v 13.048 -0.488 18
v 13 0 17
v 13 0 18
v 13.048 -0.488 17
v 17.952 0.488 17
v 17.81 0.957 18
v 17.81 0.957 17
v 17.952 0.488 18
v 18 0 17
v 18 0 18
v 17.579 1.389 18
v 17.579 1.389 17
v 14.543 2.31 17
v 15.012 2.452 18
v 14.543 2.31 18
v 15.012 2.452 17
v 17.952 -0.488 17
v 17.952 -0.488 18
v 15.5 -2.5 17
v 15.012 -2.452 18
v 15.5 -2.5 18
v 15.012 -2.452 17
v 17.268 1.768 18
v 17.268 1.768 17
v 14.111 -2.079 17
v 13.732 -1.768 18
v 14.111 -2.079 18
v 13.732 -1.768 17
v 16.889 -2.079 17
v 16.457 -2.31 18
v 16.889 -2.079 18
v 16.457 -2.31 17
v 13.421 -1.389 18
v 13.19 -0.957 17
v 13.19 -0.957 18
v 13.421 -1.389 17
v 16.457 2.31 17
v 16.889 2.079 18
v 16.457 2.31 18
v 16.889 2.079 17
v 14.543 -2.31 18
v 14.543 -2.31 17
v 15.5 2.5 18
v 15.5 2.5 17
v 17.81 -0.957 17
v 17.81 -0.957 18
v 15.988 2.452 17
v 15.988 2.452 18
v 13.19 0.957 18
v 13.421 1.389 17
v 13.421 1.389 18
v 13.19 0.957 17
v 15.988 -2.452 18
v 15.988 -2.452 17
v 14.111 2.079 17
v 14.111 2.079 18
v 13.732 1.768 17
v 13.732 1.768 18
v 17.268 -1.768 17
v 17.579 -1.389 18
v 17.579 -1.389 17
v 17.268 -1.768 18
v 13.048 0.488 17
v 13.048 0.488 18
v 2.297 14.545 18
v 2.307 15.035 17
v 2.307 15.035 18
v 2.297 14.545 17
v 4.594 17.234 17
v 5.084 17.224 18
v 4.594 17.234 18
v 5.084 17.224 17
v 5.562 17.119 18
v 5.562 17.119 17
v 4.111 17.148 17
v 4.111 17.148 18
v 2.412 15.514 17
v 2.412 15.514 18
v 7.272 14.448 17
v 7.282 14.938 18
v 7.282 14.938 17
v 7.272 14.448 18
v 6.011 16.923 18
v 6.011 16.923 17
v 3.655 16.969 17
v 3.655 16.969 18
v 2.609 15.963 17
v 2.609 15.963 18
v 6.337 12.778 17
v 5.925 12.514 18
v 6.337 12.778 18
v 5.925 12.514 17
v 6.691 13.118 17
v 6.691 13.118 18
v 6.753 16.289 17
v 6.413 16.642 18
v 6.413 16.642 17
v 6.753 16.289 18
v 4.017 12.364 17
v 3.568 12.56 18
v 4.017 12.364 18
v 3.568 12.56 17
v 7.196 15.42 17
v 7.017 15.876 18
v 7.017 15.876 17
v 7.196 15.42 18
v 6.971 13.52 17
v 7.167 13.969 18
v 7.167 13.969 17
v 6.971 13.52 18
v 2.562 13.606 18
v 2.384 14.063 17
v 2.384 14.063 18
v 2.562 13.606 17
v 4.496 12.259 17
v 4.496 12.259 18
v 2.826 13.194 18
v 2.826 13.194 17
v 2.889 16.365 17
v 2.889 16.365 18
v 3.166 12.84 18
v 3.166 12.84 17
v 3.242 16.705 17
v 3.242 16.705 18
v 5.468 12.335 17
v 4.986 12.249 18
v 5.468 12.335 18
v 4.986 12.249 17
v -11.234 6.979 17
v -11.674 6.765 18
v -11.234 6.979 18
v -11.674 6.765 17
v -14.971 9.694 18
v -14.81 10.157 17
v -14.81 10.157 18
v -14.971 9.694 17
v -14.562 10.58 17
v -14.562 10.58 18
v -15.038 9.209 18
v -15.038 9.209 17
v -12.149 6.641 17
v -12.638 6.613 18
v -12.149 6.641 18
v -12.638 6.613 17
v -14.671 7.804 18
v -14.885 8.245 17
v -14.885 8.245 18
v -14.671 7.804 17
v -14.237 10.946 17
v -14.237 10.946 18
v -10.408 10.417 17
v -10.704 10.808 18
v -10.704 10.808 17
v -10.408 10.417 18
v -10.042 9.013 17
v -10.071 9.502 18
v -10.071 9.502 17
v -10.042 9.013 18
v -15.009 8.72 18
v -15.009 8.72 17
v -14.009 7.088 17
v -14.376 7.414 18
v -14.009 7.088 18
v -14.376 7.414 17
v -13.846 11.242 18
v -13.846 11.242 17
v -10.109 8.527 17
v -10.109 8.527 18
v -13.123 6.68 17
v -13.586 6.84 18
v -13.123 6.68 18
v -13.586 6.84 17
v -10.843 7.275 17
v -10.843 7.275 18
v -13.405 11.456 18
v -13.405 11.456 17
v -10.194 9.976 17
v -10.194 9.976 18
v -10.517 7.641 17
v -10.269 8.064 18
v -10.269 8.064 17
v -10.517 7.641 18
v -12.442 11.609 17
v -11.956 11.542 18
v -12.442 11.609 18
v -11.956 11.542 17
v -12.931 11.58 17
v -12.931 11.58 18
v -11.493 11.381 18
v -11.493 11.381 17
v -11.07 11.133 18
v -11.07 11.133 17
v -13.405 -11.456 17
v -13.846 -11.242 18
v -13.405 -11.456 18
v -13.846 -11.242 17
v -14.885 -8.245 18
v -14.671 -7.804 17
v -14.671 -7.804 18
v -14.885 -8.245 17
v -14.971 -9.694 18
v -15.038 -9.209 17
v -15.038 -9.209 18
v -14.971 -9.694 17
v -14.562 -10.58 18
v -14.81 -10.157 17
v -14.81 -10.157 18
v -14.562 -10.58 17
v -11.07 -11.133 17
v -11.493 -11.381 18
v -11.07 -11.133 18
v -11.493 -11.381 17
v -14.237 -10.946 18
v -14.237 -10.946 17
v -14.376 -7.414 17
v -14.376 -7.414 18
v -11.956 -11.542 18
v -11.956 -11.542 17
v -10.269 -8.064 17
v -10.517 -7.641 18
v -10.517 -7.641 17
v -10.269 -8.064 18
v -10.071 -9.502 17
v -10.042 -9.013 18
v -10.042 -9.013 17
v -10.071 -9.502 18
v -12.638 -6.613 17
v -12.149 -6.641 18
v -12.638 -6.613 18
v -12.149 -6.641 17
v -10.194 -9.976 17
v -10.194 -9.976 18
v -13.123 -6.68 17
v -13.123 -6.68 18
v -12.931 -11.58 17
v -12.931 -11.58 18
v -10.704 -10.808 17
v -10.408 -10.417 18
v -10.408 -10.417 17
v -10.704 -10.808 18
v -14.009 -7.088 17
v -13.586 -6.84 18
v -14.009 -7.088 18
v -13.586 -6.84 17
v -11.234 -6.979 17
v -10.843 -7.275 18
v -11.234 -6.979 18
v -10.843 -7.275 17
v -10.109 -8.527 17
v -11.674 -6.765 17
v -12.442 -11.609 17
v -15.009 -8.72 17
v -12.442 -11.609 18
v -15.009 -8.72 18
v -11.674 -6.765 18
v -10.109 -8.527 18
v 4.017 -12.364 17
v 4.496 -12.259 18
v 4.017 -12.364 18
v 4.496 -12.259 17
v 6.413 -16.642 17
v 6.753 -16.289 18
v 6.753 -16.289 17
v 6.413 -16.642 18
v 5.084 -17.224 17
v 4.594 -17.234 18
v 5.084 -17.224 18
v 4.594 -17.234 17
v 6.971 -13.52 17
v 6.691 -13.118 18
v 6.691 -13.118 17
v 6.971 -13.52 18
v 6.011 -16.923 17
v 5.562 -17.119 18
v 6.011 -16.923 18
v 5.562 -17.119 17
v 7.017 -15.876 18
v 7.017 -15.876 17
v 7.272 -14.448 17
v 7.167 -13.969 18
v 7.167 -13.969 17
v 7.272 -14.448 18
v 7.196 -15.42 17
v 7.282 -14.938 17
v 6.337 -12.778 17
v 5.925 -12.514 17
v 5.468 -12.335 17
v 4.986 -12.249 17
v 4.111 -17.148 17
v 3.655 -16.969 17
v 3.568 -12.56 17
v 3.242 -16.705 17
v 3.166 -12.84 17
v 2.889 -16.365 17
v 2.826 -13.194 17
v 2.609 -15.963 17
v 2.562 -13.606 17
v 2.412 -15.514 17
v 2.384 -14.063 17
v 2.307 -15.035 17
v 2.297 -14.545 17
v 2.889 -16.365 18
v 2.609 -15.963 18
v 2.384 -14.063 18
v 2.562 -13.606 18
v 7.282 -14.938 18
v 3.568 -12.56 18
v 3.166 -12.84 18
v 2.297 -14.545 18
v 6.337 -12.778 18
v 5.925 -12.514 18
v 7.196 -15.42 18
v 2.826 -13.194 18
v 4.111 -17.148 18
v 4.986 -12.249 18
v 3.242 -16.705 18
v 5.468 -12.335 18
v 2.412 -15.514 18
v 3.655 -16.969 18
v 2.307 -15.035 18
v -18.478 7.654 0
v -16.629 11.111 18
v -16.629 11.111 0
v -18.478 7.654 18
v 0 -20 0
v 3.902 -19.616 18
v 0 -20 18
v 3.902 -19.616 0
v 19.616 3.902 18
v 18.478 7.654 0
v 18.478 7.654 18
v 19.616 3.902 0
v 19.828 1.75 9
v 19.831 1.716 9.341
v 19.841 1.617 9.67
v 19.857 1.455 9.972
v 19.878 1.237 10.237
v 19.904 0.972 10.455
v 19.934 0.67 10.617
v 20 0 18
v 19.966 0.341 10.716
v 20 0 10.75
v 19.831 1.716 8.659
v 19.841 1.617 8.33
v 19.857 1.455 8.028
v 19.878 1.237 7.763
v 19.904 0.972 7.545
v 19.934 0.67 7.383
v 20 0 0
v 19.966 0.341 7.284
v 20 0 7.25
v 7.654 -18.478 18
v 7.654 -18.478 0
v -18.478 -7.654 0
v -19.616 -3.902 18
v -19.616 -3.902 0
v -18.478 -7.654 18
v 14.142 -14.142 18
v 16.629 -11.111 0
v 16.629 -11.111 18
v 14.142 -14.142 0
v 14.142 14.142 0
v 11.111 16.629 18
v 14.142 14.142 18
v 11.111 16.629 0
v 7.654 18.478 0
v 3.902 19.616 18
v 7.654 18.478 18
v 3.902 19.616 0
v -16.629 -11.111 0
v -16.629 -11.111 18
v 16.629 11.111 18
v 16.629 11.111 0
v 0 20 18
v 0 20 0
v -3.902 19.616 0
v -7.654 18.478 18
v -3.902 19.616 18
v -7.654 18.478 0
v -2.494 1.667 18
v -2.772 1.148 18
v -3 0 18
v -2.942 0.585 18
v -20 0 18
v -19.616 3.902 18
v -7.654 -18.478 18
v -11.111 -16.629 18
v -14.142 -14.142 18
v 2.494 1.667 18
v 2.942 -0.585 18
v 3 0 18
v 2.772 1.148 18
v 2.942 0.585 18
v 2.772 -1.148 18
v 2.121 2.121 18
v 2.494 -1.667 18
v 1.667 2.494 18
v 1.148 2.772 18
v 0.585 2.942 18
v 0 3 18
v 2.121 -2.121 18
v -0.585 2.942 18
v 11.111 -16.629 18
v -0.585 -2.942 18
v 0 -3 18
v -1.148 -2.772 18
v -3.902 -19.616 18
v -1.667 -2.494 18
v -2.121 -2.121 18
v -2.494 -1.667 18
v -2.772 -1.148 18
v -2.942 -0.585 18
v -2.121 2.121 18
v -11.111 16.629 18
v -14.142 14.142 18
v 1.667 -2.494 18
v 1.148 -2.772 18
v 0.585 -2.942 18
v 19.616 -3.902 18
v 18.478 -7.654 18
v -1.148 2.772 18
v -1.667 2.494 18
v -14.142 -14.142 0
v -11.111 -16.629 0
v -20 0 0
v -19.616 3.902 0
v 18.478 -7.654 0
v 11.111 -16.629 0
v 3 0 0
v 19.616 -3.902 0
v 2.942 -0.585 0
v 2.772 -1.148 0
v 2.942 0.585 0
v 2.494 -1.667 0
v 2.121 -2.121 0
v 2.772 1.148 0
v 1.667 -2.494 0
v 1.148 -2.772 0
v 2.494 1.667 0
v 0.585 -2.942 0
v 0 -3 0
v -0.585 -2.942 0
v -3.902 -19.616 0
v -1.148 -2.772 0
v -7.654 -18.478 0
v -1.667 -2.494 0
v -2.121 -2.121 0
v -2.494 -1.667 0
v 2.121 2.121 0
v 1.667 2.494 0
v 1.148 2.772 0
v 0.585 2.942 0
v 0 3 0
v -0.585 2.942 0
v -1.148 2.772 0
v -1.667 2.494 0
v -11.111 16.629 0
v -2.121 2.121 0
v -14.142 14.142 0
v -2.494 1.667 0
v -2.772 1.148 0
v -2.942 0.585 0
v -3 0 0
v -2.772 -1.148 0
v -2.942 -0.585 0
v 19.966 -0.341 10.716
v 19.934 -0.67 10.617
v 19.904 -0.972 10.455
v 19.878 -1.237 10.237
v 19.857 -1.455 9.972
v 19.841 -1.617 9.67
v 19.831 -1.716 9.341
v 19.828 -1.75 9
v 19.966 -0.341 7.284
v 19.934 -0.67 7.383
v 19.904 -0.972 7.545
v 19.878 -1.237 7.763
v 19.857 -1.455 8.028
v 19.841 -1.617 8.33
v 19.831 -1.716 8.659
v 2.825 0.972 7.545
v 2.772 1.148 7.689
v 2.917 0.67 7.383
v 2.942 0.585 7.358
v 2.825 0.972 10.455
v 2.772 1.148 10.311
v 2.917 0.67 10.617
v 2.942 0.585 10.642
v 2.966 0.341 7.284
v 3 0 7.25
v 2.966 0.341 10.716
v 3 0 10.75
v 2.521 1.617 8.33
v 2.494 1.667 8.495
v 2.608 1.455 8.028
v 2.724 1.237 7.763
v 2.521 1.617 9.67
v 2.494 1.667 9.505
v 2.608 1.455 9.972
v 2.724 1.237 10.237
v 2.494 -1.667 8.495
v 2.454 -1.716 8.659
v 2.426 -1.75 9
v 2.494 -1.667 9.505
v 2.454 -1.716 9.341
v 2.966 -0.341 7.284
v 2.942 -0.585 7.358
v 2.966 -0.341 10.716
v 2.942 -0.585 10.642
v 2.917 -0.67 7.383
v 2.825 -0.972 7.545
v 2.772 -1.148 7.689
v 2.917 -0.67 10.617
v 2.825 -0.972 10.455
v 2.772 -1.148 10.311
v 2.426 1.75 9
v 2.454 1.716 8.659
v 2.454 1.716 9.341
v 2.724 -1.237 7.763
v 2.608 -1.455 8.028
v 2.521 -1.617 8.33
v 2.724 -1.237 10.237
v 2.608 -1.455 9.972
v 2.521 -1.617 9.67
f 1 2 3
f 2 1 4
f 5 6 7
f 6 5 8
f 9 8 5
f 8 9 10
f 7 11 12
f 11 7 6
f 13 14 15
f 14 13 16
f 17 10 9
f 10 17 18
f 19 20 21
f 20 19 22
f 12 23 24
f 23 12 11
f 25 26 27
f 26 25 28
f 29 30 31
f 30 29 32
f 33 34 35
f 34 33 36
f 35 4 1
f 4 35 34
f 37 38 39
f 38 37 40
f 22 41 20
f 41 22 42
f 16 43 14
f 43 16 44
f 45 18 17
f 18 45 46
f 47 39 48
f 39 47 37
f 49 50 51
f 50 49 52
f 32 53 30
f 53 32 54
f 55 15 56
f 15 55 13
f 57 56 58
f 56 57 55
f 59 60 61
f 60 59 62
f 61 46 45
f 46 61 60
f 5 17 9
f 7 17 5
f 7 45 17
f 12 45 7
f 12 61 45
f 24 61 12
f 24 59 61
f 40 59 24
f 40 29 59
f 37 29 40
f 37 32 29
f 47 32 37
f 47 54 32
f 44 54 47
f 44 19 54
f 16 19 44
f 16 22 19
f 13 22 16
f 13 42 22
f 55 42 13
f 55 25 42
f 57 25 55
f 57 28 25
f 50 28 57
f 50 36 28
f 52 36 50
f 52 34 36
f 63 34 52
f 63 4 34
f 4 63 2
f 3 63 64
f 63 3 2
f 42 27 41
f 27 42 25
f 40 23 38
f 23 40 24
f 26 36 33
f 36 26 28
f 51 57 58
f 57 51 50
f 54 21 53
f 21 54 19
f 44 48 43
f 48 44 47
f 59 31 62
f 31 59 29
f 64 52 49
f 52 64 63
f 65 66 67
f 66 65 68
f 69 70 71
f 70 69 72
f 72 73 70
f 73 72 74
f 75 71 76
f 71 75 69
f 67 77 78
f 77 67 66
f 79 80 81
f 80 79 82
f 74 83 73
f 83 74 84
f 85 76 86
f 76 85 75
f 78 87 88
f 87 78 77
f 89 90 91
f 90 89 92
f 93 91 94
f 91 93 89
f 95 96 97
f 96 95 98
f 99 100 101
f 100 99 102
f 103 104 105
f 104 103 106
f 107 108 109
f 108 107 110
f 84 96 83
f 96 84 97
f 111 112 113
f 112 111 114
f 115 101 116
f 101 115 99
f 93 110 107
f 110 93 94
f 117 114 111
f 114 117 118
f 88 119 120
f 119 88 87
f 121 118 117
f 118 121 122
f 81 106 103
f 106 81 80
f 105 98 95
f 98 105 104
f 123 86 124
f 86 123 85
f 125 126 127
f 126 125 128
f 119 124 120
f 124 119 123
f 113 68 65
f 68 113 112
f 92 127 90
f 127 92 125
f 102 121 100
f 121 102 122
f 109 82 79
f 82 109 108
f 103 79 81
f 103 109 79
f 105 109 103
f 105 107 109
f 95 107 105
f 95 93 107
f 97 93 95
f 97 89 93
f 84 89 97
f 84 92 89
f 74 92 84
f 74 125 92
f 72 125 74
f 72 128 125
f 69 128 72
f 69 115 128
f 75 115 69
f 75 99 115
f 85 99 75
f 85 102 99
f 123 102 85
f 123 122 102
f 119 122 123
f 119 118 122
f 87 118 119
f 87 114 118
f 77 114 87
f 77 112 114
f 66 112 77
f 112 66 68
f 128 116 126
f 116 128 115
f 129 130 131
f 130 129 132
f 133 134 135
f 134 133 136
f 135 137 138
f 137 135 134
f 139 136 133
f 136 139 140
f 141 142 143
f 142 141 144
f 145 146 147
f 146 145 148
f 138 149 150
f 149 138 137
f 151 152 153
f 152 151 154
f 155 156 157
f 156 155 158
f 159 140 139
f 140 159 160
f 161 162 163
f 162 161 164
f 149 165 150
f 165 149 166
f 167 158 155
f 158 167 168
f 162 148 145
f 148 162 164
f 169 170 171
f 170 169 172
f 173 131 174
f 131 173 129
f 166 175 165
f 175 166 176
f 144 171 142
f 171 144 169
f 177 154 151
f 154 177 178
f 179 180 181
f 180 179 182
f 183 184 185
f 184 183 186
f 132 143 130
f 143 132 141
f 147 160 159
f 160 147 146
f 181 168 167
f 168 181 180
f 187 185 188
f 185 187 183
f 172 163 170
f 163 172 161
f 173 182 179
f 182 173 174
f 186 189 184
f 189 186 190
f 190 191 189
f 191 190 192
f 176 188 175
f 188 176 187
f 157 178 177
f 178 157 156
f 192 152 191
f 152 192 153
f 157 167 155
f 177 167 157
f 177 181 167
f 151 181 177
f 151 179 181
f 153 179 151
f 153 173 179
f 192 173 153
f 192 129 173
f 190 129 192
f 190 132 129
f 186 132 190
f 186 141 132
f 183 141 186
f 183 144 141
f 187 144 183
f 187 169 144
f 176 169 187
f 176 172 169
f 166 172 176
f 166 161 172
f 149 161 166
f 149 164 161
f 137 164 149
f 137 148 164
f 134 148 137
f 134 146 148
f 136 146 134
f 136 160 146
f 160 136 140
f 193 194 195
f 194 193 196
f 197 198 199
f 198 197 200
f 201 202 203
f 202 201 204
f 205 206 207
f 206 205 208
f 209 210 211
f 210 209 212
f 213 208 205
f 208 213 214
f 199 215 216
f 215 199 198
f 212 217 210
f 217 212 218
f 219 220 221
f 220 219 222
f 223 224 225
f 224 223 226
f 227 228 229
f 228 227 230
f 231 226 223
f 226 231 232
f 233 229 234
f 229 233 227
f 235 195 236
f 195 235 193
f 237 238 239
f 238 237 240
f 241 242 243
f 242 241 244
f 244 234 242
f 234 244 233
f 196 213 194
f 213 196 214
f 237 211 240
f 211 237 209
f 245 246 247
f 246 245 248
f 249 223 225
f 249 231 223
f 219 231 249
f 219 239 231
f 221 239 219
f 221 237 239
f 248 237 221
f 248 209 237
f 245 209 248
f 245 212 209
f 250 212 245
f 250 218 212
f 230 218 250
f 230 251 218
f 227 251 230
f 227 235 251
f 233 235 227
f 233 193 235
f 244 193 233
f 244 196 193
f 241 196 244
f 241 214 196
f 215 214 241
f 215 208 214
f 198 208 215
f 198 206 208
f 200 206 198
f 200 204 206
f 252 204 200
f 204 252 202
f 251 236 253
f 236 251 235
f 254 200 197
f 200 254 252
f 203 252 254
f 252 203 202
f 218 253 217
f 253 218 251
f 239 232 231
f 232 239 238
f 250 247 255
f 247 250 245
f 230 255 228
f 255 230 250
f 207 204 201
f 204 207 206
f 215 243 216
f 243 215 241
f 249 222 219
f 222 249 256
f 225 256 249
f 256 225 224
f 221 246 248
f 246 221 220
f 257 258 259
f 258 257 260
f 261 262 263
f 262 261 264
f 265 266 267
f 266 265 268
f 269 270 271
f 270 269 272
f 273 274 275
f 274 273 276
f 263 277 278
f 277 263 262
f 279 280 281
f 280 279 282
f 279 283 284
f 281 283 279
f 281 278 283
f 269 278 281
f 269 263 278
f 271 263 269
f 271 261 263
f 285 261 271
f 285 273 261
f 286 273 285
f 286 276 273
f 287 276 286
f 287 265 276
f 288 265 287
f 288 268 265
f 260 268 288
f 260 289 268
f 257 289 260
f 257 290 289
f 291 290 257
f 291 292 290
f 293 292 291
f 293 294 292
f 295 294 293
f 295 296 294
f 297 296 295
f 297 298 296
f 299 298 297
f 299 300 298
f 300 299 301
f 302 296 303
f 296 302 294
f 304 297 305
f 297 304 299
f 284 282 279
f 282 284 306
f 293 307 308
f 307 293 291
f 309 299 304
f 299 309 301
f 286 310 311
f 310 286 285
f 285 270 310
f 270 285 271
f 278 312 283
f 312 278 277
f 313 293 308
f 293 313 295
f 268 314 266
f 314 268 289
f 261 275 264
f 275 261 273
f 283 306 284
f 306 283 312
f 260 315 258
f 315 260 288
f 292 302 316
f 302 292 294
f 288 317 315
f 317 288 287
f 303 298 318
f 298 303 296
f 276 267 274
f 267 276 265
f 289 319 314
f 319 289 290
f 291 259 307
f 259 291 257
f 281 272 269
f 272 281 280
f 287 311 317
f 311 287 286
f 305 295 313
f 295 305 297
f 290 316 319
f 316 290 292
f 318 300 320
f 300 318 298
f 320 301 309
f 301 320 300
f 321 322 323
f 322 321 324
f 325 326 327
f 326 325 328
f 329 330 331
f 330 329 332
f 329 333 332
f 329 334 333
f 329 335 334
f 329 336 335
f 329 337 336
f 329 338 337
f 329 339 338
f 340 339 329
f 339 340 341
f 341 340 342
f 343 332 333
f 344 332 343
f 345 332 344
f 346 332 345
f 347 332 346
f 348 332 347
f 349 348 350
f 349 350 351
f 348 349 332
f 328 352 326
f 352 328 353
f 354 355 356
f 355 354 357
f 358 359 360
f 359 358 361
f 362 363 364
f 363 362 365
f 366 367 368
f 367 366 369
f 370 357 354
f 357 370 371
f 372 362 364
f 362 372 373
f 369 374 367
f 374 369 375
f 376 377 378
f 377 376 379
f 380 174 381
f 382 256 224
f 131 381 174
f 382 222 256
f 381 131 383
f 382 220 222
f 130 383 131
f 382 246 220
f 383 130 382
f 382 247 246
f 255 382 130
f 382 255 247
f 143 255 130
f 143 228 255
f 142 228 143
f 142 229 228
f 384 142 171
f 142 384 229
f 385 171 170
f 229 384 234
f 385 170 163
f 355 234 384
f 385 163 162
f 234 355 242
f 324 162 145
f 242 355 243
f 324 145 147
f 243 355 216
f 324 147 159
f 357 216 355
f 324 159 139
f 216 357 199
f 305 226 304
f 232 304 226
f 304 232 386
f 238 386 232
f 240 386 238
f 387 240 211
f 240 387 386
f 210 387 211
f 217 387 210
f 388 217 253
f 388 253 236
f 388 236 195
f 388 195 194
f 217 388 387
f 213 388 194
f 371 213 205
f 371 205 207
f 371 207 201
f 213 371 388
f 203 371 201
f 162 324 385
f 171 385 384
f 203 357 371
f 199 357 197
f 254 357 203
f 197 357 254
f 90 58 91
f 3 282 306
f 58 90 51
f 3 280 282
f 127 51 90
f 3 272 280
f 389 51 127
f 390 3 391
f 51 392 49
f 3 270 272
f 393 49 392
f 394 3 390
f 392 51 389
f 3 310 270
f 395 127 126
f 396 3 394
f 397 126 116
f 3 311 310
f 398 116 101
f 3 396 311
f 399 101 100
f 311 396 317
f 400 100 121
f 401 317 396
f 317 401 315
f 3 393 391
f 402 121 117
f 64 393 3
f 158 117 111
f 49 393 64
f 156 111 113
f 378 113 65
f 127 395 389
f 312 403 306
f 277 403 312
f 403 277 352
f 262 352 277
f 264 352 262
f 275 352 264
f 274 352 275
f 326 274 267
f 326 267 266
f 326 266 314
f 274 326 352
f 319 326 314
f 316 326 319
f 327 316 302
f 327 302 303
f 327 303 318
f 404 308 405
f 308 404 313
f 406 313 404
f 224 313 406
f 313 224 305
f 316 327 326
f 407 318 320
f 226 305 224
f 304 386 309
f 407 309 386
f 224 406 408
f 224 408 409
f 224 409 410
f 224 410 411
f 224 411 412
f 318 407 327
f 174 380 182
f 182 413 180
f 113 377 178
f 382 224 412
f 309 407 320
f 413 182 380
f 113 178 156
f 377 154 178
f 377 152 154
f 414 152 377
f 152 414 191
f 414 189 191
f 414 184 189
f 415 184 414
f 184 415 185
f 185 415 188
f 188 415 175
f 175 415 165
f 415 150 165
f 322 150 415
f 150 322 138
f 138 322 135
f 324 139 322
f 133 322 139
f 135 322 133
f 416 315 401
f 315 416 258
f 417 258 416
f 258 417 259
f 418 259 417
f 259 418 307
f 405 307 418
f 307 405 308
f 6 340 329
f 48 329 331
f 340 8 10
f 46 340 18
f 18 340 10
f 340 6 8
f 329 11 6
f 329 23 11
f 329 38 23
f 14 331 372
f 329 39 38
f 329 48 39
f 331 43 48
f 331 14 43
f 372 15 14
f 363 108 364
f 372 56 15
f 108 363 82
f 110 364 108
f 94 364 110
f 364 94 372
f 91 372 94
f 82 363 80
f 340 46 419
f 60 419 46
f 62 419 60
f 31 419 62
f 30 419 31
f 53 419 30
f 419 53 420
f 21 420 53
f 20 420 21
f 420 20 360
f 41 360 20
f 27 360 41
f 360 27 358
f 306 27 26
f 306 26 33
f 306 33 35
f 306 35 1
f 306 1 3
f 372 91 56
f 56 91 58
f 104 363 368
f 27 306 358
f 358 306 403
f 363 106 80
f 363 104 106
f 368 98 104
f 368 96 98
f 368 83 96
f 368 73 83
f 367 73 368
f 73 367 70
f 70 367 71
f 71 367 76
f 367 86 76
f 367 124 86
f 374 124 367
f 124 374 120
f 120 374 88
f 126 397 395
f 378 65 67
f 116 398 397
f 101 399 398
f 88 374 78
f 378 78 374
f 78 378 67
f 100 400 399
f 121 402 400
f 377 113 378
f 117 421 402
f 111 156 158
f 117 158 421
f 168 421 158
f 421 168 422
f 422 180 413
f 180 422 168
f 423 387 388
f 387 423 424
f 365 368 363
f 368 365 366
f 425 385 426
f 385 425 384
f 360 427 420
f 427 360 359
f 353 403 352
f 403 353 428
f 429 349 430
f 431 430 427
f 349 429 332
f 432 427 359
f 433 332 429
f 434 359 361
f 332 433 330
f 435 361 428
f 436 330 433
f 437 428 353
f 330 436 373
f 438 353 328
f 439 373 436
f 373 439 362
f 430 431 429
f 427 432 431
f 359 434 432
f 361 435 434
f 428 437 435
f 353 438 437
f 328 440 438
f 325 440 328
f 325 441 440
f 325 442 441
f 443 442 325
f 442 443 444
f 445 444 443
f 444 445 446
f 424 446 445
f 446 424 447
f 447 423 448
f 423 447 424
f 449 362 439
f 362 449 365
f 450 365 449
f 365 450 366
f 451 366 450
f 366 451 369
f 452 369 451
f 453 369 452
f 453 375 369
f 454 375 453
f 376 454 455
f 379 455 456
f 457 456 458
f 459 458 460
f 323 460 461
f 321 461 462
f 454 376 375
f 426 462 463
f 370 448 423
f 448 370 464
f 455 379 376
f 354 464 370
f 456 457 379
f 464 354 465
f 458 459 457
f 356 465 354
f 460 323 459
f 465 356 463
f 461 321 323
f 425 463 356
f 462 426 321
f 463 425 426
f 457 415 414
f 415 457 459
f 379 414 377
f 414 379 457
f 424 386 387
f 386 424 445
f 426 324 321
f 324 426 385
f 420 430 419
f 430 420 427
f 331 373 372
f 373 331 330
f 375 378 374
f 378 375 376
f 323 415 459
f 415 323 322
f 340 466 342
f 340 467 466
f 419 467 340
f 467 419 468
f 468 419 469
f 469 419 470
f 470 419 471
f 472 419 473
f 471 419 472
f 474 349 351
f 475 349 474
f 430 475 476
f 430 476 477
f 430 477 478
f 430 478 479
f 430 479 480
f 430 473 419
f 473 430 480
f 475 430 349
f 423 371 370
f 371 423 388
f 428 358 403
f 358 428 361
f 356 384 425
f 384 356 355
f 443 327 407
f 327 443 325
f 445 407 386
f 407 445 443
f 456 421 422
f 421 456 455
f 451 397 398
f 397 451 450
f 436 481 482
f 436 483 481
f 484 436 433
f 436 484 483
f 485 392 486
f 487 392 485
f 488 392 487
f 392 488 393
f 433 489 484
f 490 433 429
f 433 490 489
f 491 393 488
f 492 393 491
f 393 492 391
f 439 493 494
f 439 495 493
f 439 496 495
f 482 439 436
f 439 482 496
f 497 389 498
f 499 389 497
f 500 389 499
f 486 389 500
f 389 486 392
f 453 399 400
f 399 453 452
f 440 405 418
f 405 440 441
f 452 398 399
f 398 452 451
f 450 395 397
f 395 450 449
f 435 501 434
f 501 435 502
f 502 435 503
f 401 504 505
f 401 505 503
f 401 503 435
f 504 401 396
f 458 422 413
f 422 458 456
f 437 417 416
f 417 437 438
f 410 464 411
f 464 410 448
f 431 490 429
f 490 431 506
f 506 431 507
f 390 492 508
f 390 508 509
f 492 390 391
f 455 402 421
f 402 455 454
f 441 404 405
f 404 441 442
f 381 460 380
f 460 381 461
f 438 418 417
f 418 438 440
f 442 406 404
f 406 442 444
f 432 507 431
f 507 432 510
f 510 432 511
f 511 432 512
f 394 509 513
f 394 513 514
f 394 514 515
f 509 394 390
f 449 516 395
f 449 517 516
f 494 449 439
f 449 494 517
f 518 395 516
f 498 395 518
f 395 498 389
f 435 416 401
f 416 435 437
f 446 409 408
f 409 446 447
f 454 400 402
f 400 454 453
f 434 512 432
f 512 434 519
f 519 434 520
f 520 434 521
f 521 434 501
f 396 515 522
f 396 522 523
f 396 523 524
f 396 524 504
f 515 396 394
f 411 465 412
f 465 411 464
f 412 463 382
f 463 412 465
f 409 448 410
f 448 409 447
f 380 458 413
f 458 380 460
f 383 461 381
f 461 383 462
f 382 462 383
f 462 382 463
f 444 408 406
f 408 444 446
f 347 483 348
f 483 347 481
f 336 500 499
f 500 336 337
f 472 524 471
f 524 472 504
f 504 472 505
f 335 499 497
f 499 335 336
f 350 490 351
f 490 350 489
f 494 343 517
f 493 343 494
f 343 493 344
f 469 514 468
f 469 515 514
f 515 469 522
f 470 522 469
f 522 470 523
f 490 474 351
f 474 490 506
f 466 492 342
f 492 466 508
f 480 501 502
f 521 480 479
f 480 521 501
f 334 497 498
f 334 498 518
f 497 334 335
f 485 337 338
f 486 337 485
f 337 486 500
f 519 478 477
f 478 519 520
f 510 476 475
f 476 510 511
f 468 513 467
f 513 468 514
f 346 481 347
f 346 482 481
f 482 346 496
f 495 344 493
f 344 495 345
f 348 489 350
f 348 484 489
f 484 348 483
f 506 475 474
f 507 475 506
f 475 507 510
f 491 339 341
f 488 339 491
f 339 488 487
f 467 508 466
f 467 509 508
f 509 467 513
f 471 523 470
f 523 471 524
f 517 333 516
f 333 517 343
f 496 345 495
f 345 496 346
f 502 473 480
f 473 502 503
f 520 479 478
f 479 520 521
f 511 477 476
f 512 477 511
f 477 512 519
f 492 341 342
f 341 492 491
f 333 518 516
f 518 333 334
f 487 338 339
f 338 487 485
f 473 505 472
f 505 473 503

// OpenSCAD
$fn = 32;

// ----------------------------------------------------------------------
// Control knob: dimpled knob
// ----------------------------------------------------------------------

// --- parameters (mm) ---
dimp_d = 5;               // finger dimple diameter
n_dimp = 5;               // number of dimples
dimp_r = 15.5;            // dimple ring radius
knob_d = 40;              // knob body diameter
knob_h = 18;              // knob body height
bore_d = 6;               // shaft bore diameter
set_d = 3.5;              // set screw bore diameter

dimp_step = 360 / n_dimp;  // dimple angular step

difference() {
  cylinder(h = knob_h, d = knob_d);
  translate([0, 0, -1]) cylinder(h = knob_h + 2, d = bore_d);
  translate([-1, 0, knob_h / 2]) rotate([0, 90, 0])
    cylinder(h = knob_d / 2 + bore_d / 2 + 2, d = set_d);  for (i = [0 : n_dimp - 1])
    rotate([0, 0, i * dimp_step])
      translate([dimp_r, 0, knob_h - 1])
        cylinder(h = 2, d = dimp_d);
}
